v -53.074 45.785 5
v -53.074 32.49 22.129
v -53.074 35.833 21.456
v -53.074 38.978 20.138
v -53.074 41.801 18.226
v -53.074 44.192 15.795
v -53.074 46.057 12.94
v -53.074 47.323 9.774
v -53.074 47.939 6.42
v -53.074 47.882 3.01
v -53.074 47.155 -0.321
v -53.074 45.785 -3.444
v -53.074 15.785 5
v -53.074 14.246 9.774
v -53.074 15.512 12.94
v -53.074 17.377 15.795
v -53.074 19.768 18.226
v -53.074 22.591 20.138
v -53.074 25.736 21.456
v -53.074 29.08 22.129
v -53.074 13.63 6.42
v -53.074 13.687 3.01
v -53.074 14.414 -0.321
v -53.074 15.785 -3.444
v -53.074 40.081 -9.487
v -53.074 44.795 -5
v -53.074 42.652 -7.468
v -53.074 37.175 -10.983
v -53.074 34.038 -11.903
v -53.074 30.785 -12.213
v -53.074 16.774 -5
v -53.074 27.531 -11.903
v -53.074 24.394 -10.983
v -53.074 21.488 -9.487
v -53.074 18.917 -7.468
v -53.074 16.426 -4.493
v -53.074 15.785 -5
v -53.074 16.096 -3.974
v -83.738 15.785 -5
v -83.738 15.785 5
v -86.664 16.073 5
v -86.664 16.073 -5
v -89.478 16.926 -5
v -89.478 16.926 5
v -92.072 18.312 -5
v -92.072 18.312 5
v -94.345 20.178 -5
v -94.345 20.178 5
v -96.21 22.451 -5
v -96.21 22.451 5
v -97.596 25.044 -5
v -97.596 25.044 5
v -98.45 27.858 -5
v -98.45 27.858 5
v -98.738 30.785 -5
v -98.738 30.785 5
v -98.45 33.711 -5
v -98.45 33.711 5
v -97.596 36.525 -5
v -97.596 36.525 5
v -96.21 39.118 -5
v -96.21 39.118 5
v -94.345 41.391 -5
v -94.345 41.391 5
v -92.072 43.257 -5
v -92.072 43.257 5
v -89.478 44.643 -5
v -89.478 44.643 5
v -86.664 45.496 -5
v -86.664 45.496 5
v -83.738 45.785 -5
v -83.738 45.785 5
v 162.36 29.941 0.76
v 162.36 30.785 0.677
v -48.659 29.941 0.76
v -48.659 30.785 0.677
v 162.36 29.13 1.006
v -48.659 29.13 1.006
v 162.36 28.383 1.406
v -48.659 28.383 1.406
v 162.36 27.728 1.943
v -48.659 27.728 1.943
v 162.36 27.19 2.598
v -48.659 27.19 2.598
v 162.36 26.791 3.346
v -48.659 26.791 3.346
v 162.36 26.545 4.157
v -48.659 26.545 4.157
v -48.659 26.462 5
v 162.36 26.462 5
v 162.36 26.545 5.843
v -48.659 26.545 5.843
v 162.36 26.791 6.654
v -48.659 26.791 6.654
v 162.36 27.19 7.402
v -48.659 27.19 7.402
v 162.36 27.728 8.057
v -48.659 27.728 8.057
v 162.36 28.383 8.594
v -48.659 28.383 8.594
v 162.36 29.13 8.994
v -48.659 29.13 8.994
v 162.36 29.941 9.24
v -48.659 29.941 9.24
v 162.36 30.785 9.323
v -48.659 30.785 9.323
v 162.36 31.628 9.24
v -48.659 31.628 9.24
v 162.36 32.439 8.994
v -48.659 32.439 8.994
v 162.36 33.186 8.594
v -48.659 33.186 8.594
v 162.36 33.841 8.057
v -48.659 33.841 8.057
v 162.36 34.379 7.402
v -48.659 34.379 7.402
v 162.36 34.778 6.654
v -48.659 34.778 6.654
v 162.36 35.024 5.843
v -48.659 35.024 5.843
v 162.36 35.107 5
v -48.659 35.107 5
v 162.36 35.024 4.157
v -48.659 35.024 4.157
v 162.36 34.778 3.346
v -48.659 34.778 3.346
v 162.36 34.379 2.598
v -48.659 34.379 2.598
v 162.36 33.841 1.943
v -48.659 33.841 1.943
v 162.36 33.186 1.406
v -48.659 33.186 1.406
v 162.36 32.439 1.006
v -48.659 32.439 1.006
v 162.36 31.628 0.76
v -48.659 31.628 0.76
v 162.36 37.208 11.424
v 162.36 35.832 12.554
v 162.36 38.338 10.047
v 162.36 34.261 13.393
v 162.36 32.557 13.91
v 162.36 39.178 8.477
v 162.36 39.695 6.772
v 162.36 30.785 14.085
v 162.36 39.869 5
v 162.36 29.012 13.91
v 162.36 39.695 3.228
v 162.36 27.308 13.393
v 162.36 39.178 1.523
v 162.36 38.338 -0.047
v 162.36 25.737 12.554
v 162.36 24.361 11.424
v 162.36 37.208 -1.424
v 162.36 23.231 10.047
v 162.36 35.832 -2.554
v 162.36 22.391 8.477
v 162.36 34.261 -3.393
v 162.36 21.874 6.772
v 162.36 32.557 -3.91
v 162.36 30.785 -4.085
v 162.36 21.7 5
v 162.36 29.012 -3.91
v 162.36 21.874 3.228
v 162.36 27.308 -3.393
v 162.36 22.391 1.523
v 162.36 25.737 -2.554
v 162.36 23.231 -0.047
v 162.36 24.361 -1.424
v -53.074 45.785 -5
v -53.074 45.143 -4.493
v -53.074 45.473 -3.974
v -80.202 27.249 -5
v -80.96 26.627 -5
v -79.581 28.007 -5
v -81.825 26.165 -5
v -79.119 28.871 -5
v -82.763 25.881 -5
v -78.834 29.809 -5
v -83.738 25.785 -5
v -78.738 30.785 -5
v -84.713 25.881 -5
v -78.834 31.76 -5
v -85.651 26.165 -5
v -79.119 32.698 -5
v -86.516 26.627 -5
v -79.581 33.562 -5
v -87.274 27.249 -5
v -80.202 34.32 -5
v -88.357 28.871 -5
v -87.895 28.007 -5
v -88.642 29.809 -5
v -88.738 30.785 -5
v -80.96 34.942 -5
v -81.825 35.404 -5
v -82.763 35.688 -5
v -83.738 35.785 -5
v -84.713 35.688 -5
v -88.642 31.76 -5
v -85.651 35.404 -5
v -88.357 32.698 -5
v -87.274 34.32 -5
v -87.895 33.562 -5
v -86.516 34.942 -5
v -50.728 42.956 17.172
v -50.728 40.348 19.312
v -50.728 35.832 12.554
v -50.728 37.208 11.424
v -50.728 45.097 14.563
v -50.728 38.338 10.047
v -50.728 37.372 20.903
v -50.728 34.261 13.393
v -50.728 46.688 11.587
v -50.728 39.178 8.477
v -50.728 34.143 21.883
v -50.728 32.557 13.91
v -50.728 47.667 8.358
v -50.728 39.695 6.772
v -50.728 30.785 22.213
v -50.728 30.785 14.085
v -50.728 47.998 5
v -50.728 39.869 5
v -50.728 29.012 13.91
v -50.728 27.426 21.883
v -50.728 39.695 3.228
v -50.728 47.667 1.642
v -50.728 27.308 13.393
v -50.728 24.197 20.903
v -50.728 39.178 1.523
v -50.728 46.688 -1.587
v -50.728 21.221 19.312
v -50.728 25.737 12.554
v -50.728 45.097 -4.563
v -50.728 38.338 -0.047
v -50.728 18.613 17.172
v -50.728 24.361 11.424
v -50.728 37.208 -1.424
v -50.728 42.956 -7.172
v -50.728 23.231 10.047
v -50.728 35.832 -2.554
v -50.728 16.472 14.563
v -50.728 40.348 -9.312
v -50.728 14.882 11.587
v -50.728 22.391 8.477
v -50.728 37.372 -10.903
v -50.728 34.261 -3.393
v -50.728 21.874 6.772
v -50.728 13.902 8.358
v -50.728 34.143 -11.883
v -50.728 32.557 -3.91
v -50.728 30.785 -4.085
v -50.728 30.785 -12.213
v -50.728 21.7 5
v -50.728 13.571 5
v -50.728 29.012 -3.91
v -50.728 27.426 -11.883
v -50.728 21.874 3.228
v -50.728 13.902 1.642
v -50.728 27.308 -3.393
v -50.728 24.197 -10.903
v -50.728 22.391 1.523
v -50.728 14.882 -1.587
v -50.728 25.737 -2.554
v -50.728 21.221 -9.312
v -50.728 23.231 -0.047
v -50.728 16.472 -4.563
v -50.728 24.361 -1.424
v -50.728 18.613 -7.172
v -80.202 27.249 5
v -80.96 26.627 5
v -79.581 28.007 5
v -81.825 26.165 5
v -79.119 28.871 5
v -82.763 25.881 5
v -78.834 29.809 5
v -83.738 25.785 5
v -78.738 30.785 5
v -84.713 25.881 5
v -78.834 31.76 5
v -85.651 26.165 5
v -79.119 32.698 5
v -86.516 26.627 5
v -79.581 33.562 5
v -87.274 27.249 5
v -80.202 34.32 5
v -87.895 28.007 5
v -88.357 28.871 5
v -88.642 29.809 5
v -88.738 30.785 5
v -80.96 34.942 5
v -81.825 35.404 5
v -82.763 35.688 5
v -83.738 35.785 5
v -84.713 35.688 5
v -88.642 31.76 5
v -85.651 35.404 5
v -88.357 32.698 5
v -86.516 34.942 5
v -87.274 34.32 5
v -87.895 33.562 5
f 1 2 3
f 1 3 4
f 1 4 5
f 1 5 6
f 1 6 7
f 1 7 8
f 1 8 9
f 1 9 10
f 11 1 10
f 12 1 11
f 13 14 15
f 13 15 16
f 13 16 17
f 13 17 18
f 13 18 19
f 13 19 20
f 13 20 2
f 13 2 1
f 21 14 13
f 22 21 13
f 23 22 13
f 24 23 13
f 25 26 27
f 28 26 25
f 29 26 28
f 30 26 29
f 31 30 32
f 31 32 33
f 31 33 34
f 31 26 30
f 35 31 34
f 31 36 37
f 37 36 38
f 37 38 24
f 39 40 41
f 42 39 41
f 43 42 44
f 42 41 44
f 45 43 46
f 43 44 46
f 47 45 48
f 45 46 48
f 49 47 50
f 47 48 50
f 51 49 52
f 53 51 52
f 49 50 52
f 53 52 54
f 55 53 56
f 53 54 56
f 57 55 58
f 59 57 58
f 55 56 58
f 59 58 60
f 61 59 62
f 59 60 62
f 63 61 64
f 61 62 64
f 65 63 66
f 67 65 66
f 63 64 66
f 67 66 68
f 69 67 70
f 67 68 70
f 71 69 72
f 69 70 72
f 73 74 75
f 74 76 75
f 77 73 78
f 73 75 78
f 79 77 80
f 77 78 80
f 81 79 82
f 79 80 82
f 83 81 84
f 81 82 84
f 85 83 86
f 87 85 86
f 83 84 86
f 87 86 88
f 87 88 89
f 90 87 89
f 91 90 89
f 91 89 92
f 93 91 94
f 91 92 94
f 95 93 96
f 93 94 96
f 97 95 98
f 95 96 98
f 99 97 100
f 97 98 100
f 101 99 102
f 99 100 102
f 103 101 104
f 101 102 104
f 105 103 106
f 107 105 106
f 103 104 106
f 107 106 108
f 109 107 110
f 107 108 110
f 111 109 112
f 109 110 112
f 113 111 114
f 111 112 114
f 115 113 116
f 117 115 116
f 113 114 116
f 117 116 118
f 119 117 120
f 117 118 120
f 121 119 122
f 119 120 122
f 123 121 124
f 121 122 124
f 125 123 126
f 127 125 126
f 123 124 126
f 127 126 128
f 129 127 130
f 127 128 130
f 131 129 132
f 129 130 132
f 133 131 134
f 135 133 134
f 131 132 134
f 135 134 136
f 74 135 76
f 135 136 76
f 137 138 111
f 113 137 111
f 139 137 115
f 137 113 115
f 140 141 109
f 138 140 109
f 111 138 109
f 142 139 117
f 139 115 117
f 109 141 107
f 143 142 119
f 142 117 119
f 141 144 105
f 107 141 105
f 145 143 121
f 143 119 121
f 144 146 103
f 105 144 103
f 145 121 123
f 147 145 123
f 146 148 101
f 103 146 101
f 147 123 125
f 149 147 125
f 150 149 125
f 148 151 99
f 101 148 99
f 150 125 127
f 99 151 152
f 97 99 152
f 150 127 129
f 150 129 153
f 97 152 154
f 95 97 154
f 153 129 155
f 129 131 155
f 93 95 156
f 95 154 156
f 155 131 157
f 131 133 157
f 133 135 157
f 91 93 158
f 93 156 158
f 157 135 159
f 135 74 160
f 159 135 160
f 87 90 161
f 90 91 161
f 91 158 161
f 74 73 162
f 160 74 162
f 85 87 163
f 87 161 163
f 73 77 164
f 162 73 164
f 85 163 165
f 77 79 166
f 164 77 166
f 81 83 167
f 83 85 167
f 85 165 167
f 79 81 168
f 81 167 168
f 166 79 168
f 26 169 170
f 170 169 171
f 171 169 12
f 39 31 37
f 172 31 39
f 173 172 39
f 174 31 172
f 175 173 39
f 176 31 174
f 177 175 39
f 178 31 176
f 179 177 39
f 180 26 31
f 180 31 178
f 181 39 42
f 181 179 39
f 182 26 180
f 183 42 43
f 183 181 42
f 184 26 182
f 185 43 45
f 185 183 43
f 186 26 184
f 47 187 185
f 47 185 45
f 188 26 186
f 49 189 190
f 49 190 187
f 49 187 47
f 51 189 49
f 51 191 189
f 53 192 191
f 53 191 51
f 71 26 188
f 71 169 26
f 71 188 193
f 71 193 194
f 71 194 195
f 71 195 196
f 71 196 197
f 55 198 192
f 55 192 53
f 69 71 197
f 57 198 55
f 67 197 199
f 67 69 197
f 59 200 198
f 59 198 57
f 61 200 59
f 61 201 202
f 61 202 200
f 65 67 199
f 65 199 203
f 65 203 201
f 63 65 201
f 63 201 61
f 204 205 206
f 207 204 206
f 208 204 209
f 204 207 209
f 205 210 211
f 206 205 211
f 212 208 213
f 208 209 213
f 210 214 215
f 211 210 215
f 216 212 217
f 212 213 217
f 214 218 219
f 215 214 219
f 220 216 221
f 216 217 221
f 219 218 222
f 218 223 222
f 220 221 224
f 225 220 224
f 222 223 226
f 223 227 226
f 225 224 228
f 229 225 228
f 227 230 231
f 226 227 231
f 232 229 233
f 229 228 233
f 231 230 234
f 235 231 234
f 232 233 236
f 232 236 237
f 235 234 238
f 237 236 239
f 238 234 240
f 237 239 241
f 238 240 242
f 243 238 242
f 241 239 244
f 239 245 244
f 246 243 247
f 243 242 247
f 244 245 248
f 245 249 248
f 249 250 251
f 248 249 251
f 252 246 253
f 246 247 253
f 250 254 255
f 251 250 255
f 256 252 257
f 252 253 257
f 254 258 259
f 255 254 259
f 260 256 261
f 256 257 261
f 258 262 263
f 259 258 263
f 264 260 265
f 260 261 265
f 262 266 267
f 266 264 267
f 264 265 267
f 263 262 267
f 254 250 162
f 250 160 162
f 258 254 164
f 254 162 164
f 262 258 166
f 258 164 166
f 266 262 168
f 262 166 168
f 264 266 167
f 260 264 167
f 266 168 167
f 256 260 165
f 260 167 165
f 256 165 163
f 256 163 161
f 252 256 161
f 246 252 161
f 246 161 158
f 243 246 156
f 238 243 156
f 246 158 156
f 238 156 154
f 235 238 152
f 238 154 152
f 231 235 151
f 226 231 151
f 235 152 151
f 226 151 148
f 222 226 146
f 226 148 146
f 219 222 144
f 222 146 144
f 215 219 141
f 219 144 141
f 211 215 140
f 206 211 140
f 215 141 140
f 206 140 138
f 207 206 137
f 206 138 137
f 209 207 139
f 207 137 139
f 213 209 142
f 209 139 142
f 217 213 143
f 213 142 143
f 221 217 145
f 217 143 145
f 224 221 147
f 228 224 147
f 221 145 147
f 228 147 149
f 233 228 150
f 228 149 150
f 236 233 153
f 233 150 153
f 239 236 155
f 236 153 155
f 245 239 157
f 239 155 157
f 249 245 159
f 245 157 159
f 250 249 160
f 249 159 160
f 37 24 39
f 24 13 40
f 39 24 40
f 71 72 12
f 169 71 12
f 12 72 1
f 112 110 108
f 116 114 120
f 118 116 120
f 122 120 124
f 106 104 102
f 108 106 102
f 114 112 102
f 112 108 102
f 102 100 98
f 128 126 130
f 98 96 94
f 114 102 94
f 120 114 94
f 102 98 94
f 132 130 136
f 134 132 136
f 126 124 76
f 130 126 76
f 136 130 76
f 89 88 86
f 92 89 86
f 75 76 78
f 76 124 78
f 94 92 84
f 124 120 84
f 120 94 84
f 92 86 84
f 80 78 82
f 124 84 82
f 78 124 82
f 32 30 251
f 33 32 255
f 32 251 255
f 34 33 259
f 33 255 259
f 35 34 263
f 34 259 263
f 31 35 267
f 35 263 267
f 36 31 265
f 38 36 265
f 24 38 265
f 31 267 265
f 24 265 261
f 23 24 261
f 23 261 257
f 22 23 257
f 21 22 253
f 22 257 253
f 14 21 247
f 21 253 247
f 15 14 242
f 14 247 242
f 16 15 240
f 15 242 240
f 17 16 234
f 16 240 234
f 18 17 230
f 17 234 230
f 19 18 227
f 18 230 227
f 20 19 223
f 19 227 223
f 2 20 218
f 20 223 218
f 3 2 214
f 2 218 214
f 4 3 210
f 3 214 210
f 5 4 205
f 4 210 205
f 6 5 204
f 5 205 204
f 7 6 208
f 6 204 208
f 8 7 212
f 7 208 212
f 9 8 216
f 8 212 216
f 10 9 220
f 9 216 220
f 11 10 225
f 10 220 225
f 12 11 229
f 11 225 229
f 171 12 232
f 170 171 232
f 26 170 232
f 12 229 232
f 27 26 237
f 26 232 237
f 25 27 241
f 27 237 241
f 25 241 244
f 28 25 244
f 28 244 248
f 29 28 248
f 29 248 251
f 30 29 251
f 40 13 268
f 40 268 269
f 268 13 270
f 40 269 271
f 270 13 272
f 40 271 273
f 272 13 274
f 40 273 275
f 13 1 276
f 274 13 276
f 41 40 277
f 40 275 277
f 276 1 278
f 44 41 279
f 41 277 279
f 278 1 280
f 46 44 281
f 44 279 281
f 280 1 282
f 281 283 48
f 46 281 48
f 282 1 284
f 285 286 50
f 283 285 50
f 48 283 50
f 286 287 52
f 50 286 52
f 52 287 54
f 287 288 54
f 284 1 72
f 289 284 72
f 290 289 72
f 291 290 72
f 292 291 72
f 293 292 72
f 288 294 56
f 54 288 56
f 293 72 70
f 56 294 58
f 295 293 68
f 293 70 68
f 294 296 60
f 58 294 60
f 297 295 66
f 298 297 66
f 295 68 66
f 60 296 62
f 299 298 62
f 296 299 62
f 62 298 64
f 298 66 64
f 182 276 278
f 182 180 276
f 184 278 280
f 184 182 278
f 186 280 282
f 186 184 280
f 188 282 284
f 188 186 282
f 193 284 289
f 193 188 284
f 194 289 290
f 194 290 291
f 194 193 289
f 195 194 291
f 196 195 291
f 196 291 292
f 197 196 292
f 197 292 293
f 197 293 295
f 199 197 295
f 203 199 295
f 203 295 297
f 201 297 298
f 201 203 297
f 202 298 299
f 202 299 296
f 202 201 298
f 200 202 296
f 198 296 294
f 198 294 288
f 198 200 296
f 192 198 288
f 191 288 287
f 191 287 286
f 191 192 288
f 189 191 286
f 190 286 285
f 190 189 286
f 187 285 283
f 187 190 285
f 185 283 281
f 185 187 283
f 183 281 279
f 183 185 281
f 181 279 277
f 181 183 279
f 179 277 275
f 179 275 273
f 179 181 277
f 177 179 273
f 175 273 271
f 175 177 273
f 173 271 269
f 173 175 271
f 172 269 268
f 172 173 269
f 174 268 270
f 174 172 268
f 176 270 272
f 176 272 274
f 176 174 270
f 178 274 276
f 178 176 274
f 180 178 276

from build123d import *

# Parameters (mm, degrees)
SKETCH1_R           = 5
BOSS_EXTRUDE1_DEPTH = 5


with BuildPart() as part:
    # Sketch1 → Boss-Extrude1 (new, symmetric)
    with BuildSketch(Plane.XY):
        with BuildLine():
            Line((-83.738010361, 45.784514601), (-53.074190666, 45.784514601))
            Line((-53.074190666, 45.784514601), (-53.074190666, 15.784514601))
            Line((-53.074190666, 15.784514601), (-83.738010361, 15.784514601))
            ThreePointArc((-83.738010361, 15.784514601), (-98.738010361, 30.784514601), (-83.738010361, 45.784514601))
        make_face()
        with Locations((-83.738010361, 30.784514601)):
            Circle(SKETCH1_R, mode=Mode.SUBTRACT)
    extrude(amount=BOSS_EXTRUDE1_DEPTH, both=True)

    # Sketch2 → Revolve1 (revolve)
    with BuildSketch(Plane.XY.offset(5), mode=Mode.PRIVATE) as revolve1_sk:
        Polygon((-53.074190666, 45.784514601), (-53.074190666, 47.99778913), (-50.728429203, 47.99778913), (-50.728429203, 39.869151099), (162.360473408, 39.869151099), (162.360473408, 35.107489348), (-48.658763898, 35.107489348), (-48.658763898, 30.784514601), (-53.074190666, 30.784514601), align=None)
    revolve(revolve1_sk.sketch.rotate(Axis((-48.658763898, 30.784514601, 5), (-1, 0, 0)), 90), axis=Axis((-48.658763898, 30.784514601, 5), (-1, 0, 0)))


solid = part.part
